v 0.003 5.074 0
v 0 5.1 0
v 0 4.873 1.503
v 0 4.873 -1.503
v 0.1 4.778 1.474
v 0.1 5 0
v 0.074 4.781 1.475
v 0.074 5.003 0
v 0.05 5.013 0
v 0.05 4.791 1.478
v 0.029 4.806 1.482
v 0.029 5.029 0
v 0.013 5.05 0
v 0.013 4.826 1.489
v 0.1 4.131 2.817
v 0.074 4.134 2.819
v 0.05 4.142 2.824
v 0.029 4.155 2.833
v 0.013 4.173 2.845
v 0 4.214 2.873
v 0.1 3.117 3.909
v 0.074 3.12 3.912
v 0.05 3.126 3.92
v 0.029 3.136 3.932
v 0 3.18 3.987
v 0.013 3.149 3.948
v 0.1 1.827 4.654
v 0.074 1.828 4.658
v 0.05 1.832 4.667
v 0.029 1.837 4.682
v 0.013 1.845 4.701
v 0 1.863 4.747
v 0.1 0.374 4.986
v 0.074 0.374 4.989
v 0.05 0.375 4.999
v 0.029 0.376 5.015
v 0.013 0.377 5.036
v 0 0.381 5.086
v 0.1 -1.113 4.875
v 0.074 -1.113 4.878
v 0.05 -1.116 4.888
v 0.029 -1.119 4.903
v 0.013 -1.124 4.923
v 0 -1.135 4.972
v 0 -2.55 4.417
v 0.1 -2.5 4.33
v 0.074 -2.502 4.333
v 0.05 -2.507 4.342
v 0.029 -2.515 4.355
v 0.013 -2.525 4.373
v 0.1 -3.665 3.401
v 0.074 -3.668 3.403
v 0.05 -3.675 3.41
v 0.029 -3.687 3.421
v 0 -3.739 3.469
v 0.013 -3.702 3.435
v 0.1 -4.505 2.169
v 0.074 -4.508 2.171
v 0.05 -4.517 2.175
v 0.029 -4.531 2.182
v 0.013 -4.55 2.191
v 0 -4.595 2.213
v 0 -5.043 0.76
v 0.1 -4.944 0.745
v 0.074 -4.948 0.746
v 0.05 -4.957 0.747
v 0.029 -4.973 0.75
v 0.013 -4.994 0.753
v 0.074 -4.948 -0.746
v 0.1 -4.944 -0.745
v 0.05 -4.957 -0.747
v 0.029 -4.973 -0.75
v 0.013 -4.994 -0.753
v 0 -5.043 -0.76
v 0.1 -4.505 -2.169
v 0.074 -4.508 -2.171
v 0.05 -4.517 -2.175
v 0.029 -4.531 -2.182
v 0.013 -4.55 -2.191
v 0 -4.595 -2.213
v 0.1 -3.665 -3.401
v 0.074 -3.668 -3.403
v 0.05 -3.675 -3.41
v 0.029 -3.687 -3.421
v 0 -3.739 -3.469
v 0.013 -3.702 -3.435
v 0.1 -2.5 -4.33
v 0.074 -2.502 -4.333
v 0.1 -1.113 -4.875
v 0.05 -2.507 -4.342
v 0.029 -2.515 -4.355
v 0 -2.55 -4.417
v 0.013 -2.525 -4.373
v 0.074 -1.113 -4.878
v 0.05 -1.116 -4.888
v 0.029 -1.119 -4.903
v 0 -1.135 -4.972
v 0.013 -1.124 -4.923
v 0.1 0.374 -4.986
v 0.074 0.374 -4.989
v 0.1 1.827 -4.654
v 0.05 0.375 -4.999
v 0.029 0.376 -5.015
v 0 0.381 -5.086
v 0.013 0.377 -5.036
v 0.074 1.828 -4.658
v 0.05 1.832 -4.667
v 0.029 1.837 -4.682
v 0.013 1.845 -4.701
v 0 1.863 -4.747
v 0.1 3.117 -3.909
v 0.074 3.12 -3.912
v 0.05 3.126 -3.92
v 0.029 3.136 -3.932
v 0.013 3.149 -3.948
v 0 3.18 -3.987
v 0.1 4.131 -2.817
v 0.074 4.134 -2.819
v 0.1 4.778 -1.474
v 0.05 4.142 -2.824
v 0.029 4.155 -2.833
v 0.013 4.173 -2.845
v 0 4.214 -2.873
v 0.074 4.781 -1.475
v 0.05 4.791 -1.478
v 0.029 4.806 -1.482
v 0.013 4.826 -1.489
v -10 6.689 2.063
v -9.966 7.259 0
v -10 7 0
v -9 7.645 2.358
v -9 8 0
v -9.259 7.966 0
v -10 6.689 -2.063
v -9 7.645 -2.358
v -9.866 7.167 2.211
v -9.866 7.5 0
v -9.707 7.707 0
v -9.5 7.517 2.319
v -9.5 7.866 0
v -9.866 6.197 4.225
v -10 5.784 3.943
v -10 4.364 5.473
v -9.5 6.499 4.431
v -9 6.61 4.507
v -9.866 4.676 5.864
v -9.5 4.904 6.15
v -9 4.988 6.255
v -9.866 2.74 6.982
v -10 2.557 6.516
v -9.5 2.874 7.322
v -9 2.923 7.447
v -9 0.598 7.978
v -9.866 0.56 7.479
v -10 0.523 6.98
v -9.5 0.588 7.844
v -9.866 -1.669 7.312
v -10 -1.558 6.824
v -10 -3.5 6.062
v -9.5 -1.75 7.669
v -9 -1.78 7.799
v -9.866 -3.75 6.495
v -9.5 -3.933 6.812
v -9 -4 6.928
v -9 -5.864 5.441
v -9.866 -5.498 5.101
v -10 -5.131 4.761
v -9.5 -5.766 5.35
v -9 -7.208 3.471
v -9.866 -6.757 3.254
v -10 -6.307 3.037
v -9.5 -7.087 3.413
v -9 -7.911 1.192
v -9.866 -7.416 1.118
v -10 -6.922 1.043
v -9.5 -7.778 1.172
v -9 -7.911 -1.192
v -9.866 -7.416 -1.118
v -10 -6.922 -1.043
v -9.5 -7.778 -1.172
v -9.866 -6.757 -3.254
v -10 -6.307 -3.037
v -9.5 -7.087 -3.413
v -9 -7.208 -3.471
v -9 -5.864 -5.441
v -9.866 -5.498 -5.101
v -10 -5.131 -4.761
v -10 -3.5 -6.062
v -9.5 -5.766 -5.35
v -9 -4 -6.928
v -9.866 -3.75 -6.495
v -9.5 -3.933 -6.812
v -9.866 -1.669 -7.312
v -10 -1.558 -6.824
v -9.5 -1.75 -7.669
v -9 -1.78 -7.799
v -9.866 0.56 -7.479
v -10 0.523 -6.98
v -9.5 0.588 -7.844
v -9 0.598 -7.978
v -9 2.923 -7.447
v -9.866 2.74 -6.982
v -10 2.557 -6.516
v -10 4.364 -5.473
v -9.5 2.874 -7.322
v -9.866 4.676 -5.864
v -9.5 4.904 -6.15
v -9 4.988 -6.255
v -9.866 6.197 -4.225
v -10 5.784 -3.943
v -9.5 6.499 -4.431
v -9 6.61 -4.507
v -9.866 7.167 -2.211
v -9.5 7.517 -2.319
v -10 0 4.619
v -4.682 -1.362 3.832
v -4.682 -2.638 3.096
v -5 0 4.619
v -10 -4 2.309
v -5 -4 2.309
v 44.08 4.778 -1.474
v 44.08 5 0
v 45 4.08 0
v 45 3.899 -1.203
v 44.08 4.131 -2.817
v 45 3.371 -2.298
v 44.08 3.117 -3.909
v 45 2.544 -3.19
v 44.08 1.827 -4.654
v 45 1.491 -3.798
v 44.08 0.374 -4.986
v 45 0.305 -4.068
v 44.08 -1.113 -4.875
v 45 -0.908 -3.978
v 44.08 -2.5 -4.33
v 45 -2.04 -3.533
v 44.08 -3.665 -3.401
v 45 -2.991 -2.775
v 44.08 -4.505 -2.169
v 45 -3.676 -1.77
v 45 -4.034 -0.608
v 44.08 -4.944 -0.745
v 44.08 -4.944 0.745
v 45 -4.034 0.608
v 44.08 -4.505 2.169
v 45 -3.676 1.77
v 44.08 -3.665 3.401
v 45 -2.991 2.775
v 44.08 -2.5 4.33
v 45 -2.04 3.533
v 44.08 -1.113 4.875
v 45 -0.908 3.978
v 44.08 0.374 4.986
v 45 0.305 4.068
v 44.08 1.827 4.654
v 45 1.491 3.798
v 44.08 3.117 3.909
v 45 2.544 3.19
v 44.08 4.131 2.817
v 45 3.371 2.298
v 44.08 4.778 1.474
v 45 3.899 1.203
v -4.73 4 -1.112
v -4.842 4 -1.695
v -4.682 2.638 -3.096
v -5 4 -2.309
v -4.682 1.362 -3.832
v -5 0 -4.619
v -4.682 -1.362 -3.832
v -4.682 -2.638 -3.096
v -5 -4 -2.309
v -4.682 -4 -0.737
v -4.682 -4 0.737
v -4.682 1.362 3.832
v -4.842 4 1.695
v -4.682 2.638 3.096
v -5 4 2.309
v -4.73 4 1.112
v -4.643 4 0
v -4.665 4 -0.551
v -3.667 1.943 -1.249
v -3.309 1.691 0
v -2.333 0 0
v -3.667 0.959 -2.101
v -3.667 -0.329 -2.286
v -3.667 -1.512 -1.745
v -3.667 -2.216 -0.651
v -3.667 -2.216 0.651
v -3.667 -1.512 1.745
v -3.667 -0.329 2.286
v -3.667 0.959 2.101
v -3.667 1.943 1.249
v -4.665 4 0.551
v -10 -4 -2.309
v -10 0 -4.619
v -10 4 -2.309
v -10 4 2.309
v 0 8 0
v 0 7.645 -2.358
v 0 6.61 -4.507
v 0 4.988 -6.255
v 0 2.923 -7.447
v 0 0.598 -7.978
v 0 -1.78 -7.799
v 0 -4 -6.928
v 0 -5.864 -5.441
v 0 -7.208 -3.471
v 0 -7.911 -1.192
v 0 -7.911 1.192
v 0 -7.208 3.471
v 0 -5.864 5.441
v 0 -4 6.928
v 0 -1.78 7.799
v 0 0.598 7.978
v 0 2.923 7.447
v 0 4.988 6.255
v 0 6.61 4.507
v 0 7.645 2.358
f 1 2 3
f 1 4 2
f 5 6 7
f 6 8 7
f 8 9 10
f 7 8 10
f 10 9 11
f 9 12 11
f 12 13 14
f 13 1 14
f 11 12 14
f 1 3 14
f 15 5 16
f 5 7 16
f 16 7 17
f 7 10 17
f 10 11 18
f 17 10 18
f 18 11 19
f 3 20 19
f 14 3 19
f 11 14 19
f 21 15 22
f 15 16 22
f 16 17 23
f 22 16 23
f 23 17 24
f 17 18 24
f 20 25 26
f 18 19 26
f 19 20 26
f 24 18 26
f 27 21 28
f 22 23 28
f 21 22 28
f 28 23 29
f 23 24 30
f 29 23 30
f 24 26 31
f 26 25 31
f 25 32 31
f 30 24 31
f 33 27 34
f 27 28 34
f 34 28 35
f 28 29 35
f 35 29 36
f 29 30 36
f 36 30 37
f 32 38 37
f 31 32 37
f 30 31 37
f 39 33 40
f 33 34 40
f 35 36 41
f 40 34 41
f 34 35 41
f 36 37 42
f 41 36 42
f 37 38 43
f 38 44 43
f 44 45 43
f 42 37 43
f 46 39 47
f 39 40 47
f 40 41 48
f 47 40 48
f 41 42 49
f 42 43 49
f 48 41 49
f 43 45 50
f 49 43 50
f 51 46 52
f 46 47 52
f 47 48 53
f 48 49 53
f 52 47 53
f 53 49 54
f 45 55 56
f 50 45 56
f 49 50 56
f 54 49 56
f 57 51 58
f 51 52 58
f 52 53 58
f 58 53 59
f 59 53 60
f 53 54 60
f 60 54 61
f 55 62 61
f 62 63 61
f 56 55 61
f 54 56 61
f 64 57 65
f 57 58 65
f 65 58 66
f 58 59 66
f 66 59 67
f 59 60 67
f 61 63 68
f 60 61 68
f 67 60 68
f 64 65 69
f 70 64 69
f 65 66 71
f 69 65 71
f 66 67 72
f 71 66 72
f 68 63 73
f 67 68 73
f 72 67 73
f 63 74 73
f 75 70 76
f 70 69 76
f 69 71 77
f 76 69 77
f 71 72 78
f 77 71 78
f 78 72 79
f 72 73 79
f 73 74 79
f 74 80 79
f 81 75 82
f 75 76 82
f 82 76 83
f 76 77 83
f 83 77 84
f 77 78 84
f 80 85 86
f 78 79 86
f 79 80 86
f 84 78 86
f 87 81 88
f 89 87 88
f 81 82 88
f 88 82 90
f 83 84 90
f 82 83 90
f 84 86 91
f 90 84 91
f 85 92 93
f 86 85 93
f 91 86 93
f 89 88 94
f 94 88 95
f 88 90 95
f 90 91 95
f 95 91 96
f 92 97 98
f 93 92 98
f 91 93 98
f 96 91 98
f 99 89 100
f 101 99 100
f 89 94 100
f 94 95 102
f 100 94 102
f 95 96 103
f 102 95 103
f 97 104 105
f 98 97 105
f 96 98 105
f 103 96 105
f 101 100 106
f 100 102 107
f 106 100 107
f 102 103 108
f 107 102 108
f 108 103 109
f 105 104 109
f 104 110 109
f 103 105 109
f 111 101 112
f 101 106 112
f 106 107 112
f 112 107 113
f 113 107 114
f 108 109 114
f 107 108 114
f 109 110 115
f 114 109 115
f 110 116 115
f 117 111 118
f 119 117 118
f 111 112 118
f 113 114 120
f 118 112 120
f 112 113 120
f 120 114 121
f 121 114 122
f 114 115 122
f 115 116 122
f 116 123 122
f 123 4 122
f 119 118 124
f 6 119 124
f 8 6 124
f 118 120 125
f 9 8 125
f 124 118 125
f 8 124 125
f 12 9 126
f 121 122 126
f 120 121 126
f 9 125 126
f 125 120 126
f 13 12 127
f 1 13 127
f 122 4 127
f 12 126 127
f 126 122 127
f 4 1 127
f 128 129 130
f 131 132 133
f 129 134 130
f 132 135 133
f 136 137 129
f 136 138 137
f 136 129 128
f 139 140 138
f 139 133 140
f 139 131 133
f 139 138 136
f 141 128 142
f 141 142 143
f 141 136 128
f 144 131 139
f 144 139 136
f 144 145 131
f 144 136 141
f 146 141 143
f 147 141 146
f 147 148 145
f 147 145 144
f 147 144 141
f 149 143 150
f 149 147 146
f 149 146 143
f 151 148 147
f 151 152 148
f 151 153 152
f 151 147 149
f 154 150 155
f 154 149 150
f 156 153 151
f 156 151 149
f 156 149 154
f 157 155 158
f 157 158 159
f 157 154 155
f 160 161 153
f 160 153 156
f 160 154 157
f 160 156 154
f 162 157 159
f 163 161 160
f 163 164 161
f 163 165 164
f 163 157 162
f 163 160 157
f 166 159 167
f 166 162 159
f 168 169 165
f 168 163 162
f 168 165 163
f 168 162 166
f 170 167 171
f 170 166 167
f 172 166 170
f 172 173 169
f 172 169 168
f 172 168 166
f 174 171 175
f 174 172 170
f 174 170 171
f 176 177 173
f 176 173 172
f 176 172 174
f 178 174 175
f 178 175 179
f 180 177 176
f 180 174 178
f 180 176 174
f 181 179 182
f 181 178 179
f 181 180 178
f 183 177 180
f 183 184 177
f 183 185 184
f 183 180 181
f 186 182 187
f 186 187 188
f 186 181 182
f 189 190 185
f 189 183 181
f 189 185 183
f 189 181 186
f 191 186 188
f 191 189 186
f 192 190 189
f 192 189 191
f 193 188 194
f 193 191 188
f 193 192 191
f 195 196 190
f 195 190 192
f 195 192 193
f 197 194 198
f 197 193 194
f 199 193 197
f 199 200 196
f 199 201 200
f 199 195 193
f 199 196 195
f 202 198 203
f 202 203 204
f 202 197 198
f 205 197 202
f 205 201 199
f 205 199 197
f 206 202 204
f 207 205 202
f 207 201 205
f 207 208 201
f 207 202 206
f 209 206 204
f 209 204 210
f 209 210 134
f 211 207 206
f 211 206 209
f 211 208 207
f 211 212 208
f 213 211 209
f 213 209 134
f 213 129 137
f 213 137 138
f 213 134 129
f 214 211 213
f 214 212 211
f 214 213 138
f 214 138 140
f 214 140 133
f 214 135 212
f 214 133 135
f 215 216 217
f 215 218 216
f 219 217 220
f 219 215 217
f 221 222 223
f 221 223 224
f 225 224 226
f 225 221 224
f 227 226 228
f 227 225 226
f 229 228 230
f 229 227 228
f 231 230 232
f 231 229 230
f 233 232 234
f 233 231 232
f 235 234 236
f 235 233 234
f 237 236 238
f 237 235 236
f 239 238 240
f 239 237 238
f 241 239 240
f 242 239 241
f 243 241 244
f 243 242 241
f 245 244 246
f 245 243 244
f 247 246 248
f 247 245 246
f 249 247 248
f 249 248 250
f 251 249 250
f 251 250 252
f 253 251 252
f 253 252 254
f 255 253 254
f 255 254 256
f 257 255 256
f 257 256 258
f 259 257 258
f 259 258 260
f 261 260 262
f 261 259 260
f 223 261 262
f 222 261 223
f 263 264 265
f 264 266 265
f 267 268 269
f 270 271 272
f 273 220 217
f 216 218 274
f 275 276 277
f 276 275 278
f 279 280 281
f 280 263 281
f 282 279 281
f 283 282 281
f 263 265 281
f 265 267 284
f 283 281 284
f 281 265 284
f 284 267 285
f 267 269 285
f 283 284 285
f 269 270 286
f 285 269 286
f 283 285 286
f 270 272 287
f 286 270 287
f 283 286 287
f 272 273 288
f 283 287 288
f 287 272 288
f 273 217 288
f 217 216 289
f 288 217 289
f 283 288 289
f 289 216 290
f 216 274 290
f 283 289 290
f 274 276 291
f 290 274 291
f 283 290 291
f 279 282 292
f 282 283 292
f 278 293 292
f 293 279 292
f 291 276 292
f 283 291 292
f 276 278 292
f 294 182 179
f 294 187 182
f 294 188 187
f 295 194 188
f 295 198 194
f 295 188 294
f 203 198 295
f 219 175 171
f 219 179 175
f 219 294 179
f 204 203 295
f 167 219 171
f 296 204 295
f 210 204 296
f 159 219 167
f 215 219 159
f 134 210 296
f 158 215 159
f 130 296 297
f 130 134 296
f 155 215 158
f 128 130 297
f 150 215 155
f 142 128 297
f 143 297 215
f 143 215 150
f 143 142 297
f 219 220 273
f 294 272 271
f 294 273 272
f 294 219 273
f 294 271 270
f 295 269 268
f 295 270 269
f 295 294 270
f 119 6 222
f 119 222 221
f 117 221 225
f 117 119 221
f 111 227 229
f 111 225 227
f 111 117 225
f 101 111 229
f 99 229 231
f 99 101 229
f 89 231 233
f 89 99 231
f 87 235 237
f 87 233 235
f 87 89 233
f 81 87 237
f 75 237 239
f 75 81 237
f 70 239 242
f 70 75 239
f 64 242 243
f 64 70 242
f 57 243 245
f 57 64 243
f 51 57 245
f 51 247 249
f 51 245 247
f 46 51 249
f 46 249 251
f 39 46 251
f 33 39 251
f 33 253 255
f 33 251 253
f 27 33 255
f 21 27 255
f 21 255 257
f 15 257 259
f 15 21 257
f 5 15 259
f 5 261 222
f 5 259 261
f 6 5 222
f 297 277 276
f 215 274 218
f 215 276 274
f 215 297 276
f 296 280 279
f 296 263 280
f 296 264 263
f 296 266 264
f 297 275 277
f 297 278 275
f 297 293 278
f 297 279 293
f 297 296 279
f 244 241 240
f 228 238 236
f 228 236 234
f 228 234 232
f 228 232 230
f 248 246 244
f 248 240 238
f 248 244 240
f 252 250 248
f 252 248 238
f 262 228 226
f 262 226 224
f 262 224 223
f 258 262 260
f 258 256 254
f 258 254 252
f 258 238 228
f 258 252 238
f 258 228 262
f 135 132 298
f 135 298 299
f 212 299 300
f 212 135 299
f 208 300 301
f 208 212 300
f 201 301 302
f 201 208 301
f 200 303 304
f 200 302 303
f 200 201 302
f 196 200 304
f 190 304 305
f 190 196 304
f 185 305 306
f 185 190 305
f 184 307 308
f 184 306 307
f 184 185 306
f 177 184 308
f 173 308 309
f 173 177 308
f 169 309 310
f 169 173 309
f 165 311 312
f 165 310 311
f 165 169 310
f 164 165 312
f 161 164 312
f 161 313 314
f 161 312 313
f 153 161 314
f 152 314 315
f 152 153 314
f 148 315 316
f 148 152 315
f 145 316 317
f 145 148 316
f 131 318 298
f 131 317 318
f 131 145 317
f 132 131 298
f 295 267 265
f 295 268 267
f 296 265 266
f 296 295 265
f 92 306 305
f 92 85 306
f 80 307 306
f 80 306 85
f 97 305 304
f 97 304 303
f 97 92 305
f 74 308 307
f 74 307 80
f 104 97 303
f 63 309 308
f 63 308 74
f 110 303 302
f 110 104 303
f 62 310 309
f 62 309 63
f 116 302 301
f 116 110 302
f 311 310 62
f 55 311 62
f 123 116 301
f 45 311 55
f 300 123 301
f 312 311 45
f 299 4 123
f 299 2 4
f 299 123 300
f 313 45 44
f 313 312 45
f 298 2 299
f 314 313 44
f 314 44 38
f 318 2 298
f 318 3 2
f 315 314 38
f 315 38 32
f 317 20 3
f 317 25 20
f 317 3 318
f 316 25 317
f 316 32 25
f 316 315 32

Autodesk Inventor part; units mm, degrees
ref_plane "YZ Plane" through (0, 0, 0) normal (1, 0, 0) x (0, 1, 0)
ref_plane "XZ Plane" through (0, 0, 0) normal (0, 1, 0) x (-1, 0, 0)
sketch "Sketch1" plane through (0, 0, 0) normal (0, 0, 1) x (1, 0, 0)
  line L0 (-2.3333, 0) -> (45, 0)
  line L1 (45, 0) -> (45, 5)
  line L2 (45, 5) -> (13, 5)
  line L3 (13, 5) -> (12.0797, 5)
  line L4 (12.0797, 5) -> (0, 5)
  line L5 (0, 5) -> (0, 8)
  line L6 (0, 8) -> (-10, 8)
  line L7 (-10, 8) -> (-10, 4.6188)
  line L8 (-10, 4.6188) -> (-5, 4.6188)
  line L9 (-5, 4.6188) -> (-2.3333, 0)
  line L10 (-21, 0) -> (56, 0) projected
  line L11 (0, -1.6) -> (0, 9.6) projected
  line L12 (13, 5) -> (0, 5) construction
  dimension "d1" = 32
  dimension "d2" = 0.9203
  dimension "d3" = 10
  dimension "d4" = 5
  dimension "d5" = 60
  dimension "d6" = 10
  dimension "d7" = 10
  dimension "d8" = 9.2376
  dimension "d9" = 16
  dimension "d26" = 45
revolve "Body" add sketch "Sketch1" angle 360 about axis through (-2.3333, 0, 0) along (1, 0, 0)
sketch "Sketch2" plane through (-10, 0, 0) normal (-1, 0, 0) x (0, 0, 1)
  circle A0 centre (0, 0) radius 4.6188 projected
  line L0 (0, -11.2) -> (0, 11.2) projected
  line L1 (-11.2, 0) -> (11.2, 0) projected
  line L2 (4.6188, 0) -> (2.3094, -4)
  line L3 (2.3094, -4) -> (-2.3094, -4)
  line L4 (-2.3094, -4) -> (-4.6188, 0)
  line L5 (-4.6188, 0) -> (-2.3094, 4)
  line L6 (-2.3094, 4) -> (2.3094, 4)
  line L7 (2.3094, 4) -> (4.6188, 0)
extrude "Slot" add sketch "Sketch2" against normal up to next contours L7 A0 | A0 L2 | L6 L0 A0 | A0 L0 L3 | L0 L6 A0 | A0 L3 L0 | L4 A0 | A0 L5
fillet "Fillet1" radius 1 1 edges at (-10, -8, 0)
thread "Thread" size "M10x1.5" class "6g" standard "ISO Metric profile" length 32
chamfer "Chamfer1" distance 0.9202 distance2 0.9202 1 edges at (45, -5, 0) measured on face at (45, -1.105, 0.7295)
ref_plane "Work Plane1" through (29, 0, 0) normal (0, -1, 0) x (1, 0, 0)
fillet "Fillet2" radius 0.1 1 edges at (0, -5, 0)
equation "\"d1\" = GEL"
equation "\"d3\" = KOH"
equation "\"d4\" = INTI"
equation "\"d6\" = GD"
equation "\"d7\" = BDM"
equation "\"d8\" = 1.1547 * SW"
equation "\"d9\" = KOD"
equation "\"d26\" = NLG"
equation "\"d30\" = R"
equation "\"d17\" = RR"
equation "\"d13\" = GEL"
equation "\"d15\" = -0.5 * SPD + 0.5 * GD"
equation "\"d16\" = GUL"
equation "\"GD\" = NND"
equation "\"NLG\" = 45"
equation "\"GEL\" = 32"
equation "\"KOD\" = 16"
equation "\"KOH\" = NND"
equation "\"INTI\" = 5"
equation "\"GAL\" = 0.61345 * PTC"
equation "\"GUL\" = 0.61345 * PTC"
equation "\"BDM\" = NND"
equation "\"SW\" = 8"
equation "\"RR\" = 0.1 * NND"
equation "\"SPD\" = NND - 1.2269 * PTC"
equation "\"R\" = 0.1"
equation "\"TOA\" = 30deg"
equation "\"GD1\" = THREADDIA - 1.2269 * PTC"
equation "\"FAWI\" = 45deg"
equation "\"PTC\" = 1.5"
equation "\"E0\" = 1.155 * SW"
equation "\"NND\" = 10"
equation "\"THREADDIA\" = 10"
properties part number "M10x35 SHCS A2" material "Stainless Steel AISI 304"
